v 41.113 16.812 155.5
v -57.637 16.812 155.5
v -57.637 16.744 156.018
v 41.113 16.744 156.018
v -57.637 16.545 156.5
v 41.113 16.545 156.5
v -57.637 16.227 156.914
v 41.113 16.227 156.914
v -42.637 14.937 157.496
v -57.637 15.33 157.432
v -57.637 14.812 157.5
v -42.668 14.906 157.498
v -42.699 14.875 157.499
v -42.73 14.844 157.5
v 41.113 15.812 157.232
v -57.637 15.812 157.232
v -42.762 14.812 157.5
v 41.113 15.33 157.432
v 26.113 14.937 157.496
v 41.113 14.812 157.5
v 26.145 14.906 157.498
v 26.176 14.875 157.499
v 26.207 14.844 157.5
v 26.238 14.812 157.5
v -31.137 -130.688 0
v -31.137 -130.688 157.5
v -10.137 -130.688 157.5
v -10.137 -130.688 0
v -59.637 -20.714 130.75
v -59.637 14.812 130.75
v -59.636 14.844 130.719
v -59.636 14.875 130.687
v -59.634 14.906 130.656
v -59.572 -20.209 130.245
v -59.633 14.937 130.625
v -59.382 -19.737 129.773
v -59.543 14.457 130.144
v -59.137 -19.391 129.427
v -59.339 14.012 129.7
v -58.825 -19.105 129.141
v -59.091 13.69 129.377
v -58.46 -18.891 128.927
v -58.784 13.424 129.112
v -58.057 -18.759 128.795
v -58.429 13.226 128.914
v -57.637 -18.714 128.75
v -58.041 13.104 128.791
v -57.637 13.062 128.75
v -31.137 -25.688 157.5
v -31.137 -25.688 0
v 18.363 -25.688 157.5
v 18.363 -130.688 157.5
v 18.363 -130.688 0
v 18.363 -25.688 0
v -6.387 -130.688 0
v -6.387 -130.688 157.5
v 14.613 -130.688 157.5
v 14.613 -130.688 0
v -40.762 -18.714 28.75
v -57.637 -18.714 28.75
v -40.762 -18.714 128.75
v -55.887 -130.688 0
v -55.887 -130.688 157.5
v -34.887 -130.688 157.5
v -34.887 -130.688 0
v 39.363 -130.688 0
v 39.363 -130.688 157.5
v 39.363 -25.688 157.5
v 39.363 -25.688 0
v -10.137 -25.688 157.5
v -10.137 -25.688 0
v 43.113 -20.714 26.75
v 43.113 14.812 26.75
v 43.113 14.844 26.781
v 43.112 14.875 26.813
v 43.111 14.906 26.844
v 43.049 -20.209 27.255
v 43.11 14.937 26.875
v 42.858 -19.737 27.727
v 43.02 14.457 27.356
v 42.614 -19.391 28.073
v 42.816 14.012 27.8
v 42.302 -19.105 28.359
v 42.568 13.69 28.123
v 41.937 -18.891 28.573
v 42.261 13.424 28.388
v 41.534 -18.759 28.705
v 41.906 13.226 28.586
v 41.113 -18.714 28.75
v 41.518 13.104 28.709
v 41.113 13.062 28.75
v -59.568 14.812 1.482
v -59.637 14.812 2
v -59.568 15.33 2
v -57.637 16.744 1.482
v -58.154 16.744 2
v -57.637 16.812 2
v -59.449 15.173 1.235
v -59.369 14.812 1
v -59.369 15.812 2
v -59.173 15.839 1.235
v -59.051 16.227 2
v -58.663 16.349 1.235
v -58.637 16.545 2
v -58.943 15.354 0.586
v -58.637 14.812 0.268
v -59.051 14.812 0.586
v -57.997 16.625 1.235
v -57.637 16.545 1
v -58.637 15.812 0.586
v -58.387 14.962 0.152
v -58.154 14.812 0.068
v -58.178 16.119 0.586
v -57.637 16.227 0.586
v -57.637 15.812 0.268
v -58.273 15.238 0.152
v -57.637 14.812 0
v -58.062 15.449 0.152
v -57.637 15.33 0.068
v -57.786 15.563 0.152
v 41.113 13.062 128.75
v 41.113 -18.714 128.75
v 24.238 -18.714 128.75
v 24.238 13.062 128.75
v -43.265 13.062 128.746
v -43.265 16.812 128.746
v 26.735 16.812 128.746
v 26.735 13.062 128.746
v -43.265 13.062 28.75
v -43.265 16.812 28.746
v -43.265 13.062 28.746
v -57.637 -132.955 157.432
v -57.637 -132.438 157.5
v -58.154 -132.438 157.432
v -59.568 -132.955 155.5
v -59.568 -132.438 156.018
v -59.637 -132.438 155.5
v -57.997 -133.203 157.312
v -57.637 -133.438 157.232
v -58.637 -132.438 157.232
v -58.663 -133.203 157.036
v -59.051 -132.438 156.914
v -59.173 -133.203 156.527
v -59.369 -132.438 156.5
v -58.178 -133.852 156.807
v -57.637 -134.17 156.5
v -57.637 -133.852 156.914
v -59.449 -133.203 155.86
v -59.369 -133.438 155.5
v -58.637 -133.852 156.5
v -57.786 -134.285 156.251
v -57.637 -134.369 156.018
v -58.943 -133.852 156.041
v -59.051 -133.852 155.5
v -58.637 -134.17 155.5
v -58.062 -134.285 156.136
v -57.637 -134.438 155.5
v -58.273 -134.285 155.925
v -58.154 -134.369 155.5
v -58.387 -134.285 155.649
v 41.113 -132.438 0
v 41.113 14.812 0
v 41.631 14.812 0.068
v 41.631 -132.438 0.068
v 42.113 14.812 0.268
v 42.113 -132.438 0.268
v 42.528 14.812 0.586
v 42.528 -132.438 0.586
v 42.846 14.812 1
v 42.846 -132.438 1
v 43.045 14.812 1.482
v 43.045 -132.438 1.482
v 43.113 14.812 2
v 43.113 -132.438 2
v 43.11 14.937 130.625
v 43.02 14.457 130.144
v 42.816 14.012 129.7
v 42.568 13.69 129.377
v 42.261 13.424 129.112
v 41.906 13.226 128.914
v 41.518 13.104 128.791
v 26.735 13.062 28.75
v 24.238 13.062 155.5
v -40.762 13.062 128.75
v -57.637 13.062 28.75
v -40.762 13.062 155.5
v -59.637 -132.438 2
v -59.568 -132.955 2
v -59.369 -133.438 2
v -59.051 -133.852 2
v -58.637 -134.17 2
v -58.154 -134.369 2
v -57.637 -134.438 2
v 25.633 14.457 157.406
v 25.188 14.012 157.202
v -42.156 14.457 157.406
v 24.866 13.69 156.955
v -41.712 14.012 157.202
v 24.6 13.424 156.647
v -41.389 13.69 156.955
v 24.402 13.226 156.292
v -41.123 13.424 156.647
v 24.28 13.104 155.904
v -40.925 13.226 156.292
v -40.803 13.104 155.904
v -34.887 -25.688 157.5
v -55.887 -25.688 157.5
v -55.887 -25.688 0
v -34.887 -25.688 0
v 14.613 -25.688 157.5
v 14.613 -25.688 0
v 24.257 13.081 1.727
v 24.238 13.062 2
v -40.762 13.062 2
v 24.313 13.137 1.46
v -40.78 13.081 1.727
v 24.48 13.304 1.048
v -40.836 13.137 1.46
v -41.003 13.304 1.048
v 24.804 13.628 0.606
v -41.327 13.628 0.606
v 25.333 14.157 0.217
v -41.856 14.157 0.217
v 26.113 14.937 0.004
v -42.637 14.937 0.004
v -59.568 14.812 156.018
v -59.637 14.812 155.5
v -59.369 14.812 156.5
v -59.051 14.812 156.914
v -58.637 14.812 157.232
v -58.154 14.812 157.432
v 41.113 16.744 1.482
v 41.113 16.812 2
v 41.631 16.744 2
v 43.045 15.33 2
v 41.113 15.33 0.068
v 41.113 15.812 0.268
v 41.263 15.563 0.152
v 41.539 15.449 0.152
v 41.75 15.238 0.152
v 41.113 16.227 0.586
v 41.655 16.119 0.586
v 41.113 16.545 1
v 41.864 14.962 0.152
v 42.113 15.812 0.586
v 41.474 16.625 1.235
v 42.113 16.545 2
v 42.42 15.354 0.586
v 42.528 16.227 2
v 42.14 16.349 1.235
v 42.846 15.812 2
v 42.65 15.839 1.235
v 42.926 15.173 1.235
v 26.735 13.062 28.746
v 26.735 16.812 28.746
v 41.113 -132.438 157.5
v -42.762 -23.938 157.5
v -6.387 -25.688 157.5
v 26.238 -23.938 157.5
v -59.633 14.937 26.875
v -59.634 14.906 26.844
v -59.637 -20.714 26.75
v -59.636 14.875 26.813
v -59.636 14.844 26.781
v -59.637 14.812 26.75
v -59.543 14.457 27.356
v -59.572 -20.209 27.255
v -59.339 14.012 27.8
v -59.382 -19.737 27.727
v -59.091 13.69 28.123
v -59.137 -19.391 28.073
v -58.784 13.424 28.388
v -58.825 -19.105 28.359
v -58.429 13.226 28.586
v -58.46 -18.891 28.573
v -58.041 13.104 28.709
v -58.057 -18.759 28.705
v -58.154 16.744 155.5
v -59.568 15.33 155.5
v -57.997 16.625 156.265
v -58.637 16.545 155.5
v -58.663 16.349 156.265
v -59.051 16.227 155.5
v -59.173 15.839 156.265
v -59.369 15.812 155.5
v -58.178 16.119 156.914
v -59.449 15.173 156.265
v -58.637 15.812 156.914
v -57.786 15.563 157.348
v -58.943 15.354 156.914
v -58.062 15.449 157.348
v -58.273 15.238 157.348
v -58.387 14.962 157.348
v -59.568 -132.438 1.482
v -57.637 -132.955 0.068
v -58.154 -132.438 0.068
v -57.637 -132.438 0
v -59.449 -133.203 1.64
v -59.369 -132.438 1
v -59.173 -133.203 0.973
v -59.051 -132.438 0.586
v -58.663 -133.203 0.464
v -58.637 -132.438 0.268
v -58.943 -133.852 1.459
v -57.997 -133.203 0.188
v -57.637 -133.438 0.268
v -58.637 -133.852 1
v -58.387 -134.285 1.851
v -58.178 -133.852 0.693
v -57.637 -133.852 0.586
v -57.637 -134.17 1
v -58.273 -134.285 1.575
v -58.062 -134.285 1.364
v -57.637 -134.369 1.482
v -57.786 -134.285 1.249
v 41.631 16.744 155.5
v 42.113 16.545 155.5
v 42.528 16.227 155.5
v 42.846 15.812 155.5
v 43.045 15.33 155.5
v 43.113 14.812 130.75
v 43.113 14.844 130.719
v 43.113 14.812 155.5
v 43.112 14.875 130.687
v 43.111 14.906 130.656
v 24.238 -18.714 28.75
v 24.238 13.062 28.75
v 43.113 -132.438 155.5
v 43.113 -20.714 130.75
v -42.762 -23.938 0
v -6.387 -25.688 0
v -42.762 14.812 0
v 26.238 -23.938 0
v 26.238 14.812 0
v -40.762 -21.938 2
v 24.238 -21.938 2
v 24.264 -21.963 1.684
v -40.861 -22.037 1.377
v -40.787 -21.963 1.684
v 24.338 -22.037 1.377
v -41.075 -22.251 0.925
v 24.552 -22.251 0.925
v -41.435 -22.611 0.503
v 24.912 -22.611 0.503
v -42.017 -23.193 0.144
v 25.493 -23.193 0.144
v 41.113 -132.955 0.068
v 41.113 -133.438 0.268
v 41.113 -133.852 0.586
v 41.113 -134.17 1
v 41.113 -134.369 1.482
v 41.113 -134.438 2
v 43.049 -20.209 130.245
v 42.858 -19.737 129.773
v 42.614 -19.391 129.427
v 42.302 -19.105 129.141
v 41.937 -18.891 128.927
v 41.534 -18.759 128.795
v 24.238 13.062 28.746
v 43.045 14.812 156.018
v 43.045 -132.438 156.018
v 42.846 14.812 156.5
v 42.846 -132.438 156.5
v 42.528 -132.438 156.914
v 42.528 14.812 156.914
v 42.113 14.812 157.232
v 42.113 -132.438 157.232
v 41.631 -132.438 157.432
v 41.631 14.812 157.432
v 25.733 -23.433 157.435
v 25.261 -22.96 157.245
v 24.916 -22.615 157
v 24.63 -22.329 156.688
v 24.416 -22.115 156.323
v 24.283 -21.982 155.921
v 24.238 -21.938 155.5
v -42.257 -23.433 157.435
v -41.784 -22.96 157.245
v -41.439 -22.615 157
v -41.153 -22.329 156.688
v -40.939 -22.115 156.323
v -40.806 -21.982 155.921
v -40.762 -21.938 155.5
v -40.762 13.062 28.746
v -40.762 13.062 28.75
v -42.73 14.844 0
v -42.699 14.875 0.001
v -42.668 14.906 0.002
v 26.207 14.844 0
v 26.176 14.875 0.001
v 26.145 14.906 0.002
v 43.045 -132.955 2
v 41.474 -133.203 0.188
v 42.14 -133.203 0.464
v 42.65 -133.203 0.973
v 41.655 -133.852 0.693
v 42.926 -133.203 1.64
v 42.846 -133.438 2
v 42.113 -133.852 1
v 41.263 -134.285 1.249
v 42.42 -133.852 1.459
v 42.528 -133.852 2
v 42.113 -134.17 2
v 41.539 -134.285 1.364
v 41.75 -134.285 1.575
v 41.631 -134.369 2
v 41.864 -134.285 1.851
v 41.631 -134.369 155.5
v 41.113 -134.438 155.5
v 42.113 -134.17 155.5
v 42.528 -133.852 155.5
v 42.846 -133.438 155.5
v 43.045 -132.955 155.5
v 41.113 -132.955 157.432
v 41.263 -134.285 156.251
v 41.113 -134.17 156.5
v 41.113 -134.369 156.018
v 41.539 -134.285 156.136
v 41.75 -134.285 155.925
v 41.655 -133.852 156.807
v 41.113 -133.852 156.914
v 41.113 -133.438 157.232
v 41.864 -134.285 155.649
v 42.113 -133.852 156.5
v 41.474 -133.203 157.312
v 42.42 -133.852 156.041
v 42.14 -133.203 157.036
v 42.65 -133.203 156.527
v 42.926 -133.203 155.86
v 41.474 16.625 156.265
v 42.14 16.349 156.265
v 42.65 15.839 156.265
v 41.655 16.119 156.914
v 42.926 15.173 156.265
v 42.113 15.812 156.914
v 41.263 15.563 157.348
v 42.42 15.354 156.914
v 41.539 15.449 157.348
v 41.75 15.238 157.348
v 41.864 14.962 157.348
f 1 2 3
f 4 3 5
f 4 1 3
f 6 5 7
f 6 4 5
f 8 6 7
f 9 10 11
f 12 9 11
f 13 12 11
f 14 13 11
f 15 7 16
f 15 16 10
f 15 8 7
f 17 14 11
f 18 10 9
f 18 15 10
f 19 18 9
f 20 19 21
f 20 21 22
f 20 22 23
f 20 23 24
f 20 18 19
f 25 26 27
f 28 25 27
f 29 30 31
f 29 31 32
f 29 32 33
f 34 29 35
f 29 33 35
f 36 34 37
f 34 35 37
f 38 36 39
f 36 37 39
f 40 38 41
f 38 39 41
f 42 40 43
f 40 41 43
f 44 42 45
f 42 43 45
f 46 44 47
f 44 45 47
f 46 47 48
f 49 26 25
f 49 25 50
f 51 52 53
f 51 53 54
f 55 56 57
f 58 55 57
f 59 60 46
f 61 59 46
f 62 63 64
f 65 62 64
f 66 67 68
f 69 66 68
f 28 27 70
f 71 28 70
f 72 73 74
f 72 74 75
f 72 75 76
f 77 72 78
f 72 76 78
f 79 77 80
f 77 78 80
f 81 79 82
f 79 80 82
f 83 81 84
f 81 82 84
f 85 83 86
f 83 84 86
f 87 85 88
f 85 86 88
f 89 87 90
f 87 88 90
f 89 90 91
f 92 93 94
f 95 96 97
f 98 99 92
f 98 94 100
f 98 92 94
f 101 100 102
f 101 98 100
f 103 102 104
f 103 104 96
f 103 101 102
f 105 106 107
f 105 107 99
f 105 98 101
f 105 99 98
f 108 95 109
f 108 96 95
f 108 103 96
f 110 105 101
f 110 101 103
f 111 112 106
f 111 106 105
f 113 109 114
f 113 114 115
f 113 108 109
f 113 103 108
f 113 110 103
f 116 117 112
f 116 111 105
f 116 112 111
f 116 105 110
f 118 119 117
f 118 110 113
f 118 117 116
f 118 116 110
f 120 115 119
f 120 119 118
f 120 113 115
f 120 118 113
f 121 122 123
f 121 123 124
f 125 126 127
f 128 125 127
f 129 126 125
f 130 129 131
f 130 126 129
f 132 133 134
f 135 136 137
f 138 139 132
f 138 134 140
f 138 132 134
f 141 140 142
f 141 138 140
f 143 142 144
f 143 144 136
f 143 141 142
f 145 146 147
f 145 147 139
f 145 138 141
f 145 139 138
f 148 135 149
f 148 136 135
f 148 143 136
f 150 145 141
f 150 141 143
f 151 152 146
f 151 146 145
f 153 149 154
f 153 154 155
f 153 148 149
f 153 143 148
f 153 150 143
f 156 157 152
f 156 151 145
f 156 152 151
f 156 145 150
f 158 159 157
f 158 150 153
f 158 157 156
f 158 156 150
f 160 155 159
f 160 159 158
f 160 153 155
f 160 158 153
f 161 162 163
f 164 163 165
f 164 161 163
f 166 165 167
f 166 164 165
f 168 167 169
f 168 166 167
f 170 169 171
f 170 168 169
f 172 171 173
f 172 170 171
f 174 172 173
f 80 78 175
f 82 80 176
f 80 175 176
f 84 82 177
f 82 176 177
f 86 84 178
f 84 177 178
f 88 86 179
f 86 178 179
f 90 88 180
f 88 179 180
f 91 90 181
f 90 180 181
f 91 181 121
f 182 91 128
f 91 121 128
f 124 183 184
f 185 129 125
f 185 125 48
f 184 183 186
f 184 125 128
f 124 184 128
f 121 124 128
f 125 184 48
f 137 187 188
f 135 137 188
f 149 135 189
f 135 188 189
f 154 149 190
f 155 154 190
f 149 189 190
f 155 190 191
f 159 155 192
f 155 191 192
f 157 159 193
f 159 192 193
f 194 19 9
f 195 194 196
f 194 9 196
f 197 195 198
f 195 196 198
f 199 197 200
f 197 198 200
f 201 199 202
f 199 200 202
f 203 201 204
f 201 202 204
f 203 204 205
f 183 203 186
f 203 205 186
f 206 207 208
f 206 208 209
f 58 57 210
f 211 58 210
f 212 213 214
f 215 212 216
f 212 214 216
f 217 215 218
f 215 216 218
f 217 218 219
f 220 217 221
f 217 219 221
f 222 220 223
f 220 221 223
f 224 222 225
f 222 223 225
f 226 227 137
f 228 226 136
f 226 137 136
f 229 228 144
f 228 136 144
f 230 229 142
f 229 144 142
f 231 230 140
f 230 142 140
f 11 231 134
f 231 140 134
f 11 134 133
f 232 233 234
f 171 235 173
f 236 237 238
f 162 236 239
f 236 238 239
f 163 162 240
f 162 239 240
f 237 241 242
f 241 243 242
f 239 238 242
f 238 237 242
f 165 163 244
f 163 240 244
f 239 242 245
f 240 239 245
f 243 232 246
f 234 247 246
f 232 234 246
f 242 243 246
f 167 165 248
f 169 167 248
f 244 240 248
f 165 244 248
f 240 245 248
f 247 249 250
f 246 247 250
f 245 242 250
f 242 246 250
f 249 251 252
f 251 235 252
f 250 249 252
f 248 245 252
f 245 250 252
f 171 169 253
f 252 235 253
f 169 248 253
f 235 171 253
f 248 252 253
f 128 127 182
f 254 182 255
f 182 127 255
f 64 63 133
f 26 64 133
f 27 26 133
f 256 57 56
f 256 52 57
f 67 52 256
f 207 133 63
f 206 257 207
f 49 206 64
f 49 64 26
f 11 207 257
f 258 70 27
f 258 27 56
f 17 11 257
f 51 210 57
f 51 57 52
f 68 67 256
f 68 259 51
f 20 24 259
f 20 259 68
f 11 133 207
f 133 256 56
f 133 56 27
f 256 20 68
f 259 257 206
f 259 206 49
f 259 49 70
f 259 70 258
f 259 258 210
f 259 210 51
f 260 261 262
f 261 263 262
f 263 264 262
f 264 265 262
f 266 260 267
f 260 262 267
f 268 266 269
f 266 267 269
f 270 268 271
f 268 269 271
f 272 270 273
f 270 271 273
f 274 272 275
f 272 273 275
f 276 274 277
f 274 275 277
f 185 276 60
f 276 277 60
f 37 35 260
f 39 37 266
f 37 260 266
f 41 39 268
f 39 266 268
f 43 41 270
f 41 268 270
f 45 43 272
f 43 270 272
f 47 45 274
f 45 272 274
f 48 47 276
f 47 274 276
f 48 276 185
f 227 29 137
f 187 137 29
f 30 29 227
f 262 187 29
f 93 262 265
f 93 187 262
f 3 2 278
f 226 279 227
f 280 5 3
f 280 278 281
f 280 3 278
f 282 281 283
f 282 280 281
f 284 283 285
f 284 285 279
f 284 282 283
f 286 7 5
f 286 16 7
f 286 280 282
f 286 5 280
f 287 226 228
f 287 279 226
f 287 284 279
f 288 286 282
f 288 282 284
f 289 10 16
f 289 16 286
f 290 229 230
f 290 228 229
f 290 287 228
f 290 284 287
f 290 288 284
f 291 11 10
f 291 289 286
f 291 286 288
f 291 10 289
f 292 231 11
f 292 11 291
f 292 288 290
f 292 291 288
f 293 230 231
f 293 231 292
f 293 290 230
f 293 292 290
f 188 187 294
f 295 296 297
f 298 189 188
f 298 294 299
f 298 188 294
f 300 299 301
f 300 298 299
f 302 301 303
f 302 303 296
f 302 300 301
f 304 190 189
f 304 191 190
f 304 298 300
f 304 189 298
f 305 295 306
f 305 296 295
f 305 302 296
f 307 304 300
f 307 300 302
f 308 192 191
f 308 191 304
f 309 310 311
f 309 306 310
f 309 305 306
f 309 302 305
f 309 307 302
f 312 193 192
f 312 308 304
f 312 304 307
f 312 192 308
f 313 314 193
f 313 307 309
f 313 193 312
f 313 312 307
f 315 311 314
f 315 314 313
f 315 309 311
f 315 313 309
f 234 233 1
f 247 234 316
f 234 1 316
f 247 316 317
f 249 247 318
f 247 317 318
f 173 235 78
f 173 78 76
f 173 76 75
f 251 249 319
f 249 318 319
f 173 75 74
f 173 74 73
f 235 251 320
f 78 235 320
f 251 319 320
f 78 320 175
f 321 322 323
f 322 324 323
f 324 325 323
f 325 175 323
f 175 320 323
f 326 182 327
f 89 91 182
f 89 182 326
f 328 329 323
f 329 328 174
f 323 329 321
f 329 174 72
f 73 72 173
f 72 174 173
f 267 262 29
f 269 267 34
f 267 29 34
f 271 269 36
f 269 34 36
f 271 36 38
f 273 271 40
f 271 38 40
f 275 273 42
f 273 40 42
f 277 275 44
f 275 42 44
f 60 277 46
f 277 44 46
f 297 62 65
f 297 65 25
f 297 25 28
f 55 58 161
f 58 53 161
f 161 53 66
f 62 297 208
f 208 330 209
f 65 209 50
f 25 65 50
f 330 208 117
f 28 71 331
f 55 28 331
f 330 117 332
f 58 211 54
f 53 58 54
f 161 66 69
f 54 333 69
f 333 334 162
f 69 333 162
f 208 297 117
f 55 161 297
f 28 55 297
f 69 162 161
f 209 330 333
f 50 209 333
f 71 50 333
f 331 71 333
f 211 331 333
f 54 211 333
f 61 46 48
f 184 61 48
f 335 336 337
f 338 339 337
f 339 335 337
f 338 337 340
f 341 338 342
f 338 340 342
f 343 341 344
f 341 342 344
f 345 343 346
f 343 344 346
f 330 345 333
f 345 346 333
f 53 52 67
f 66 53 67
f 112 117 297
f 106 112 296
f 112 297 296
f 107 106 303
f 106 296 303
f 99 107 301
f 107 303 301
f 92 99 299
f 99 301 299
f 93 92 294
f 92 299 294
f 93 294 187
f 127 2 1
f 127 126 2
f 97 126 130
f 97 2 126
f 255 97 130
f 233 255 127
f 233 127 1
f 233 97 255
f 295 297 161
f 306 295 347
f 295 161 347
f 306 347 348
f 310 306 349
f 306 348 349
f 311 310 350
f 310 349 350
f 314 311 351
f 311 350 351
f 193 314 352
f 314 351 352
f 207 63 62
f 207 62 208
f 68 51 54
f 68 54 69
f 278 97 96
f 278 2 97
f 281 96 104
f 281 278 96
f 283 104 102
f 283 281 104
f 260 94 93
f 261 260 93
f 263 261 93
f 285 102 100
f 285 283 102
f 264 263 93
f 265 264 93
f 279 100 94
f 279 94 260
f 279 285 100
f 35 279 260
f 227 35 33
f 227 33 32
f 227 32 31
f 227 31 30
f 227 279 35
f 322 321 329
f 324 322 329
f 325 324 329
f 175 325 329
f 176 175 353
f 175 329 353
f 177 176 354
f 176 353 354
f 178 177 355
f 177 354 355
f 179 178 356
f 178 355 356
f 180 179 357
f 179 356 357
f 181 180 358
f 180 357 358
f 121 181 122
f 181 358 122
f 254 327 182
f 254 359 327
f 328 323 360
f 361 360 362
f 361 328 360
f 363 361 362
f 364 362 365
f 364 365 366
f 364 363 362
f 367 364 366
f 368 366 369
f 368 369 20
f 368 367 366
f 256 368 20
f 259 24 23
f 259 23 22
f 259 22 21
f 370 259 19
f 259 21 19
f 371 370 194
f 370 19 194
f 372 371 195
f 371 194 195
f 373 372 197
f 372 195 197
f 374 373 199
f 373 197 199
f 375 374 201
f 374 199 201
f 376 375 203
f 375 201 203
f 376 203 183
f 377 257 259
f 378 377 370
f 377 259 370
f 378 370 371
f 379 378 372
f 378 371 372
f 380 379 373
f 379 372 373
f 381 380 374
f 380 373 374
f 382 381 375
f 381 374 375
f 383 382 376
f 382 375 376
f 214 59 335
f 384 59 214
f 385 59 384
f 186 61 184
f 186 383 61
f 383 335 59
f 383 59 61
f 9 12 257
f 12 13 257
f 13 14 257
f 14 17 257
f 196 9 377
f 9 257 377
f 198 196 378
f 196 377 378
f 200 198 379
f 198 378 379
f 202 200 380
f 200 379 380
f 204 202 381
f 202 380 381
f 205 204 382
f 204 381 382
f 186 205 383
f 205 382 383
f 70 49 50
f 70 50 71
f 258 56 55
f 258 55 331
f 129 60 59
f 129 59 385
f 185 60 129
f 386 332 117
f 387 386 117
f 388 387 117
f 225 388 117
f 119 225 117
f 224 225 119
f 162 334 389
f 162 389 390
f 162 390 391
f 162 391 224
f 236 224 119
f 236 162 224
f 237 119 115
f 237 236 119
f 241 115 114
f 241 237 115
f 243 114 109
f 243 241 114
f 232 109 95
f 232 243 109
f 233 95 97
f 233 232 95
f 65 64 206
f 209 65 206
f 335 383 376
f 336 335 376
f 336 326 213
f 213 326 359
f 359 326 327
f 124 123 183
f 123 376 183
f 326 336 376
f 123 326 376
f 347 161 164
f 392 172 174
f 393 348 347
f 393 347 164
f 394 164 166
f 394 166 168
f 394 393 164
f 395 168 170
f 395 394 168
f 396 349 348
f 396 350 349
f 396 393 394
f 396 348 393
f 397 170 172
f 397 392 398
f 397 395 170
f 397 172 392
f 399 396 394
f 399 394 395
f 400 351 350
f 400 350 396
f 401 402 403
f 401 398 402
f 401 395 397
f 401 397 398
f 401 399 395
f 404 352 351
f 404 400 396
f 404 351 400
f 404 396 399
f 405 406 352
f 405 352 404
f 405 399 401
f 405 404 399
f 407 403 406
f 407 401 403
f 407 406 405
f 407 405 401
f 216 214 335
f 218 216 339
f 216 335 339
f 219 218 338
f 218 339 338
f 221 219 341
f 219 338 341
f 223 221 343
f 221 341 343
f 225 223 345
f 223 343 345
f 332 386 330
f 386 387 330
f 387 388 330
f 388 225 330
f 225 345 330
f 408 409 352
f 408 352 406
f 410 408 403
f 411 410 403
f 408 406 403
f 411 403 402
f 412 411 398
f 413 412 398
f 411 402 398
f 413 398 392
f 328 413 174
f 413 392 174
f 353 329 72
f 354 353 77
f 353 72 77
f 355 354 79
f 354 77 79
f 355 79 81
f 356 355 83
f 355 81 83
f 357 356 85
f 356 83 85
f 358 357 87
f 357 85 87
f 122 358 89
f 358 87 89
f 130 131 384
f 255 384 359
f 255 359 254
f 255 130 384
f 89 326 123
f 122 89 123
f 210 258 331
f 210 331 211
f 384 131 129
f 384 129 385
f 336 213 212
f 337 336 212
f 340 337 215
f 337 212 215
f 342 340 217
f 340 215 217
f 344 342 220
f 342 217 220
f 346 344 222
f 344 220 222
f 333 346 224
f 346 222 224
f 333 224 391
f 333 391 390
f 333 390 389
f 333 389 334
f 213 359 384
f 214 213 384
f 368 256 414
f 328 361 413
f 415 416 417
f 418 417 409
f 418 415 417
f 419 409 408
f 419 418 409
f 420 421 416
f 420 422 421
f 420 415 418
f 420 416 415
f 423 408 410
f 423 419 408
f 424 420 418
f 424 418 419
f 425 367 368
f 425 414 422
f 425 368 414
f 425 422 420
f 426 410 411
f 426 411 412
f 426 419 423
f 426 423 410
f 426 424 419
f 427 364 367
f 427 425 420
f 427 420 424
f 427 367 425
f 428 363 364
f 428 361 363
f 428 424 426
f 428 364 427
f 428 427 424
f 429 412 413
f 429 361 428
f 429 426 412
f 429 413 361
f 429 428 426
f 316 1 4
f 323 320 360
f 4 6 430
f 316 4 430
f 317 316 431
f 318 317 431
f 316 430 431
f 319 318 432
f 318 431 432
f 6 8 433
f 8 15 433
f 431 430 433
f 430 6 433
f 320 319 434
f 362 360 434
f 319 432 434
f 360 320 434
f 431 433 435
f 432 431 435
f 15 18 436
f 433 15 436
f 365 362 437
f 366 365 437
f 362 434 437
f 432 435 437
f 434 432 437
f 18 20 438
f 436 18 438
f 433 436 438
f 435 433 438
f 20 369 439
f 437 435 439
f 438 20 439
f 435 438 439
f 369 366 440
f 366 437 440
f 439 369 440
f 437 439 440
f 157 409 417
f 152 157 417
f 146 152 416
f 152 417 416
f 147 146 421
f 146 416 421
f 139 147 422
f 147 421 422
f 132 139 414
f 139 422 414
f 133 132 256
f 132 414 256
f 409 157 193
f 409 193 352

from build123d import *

# Parameters (mm, degrees)
SKETCH7_W           = 102.75
SKETCH7_H           = 151.25
BOSS_EXTRUDE4_DEPTH = 157.5
SKETCH9_W           = 65
SKETCH9_H           = 35
SKETCH9_W_2         = 21
SKETCH9_H_2         = 105
CUT_EXTRUDE5_DEPTH  = 157.5
SKETCH10_W          = 100
SKETCH10_H          = 31.776495021
CUT_EXTRUDE6_DEPTH  = 157.5
FILLET3_R           = 2
FILLET4_R           = 2
FILLET6_R           = 2
FILLET7_R           = 2
FILLET8_R           = 2
FILLET9_R           = 2
SKETCH13_W          = 70
SKETCH13_H          = 100
CUT_EXTRUDE7_DEPTH  = 3.75


with BuildPart() as part:
    # Sketch7 → Boss-Extrude4 (new body)
    with BuildSketch(Plane.XY):
        with Locations((-8.261523783, -58.812543528)):
            Rectangle(SKETCH7_W, SKETCH7_H)
    extrude(amount=BOSS_EXTRUDE4_DEPTH)

    # Sketch9 → Cut-Extrude5 (cut)
    with BuildSketch(Plane.XY.offset(157.5)):
        with Locations((-8.261523783, -4.437543528)):
            Rectangle(SKETCH9_W, SKETCH9_H)
        with Locations((-45.386523783, -78.187543528)):
            Rectangle(SKETCH9_W_2, SKETCH9_H_2)
        with Locations((-20.636523783, -78.187543528)):
            Rectangle(SKETCH9_W_2, SKETCH9_H_2)
        with Locations((4.113476217, -78.187543528)):
            Rectangle(SKETCH9_W_2, SKETCH9_H_2)
        with Locations((28.863476217, -78.187543528)):
            Rectangle(SKETCH9_W_2, SKETCH9_H_2)
    extrude(amount=-CUT_EXTRUDE5_DEPTH, mode=Mode.SUBTRACT)

    # Sketch10 → Cut-Extrude6 (cut)
    with BuildSketch(Plane.ZY.offset(59.636523783)):
        with Locations((78.75, -2.825791039)):
            Rectangle(SKETCH10_W, SKETCH10_H)
    extrude(amount=-CUT_EXTRUDE6_DEPTH, mode=Mode.SUBTRACT)

    # Fillet3
    fillet3_edges = [part.edges().sort_by_distance(p)[0] for p in [
        (43.113476217, 16.812456472, 78.75),
    ]]
    fillet(fillet3_edges, radius=FILLET3_R)

    # Fillet4
    fillet4_edges = [part.edges().sort_by_distance(p)[0] for p in [
        (-9.261523783, 16.812456472, 0),
        (-9.261523783, 16.812456472, 157.5),
        (42.52768978, 16.226670034, 0),
        (42.52768978, 16.226670034, 157.5),
        (43.113476217, -59.812543528, 157.5),
        (43.113476217, -59.812543528, 0),
        (-59.636523783, 16.812456472, 78.75),
    ]]
    fillet(fillet4_edges, radius=FILLET4_R)

    # Fillet6
    # the kernel refuses this fillet: 2 mm, written as the material it takes off along each edge
    with BuildSketch(Plane(origin=(-57.636523783, 14.812456472, 155.5), x_dir=(-1, 0, 0), z_dir=(0, 0, 1))) as fillet6_piece_1_section:
        Polygon((0, 0), (FILLET6_R, 0), (FILLET6_R, -FILLET6_R), (0, -FILLET6_R), align=None)
    fillet6_piece_1 = extrude(amount=FILLET6_R, mode=Mode.PRIVATE)
    fillet6_piece_1 = fillet6_piece_1 - Plane(origin=(-57.636523783, 14.812456472, 155.5), x_dir=(0.7071067811865475, -0.7071067811865475, 0), z_dir=(0, 0, 1)) * Sphere(FILLET6_R, mode=Mode.PRIVATE)
    add(fillet6_piece_1, mode=Mode.SUBTRACT)
    with BuildSketch(Plane(origin=(-57.636523783, 14.812456472, 2), x_dir=(-1, 0, 0), z_dir=(0, 0, -1))) as fillet6_piece_2_section:
        Polygon((0, 0), (FILLET6_R, 0), (FILLET6_R, FILLET6_R), (0, FILLET6_R), align=None)
    fillet6_piece_2 = extrude(amount=FILLET6_R, mode=Mode.PRIVATE)
    fillet6_piece_2 = fillet6_piece_2 - Plane(origin=(-57.636523783, 14.812456472, 2), x_dir=(0.7071067811865475, -0.7071067811865475, 0), z_dir=(0, 0, -1)) * Sphere(FILLET6_R, mode=Mode.PRIVATE)
    add(fillet6_piece_2, mode=Mode.SUBTRACT)
    with BuildSketch(Plane(origin=(-59.636523783, -139.437543528, 0), x_dir=(1, 0, 0), z_dir=(0, 1, 0))) as fillet6_piece_3:
        with BuildLine():
            CenterArc((FILLET6_R, -FILLET6_R), FILLET6_R, 90, 90)
            Line((0, -FILLET6_R), (0, 0))
            Line((0, 0), (FILLET6_R, 0))
        make_face()
    extrude(amount=154.25, mode=Mode.SUBTRACT)
    with BuildSketch(Plane(origin=(-59.636523783, -139.437543528, 157.5), x_dir=(1, 0, 0), z_dir=(0, 1, 0))) as fillet6_piece_4:
        with BuildLine():
            CenterArc((FILLET6_R, FILLET6_R), FILLET6_R, 180, 90)
            Line((0, FILLET6_R), (0, 0))
            Line((0, 0), (FILLET6_R, 0))
        make_face()
    extrude(amount=154.25, mode=Mode.SUBTRACT)
    with BuildSketch(Plane(origin=(-59.636523783, -134.437543528, -5), x_dir=(1, 0, 0), z_dir=(0, 0, 1))) as fillet6_piece_5:
        with BuildLine():
            CenterArc((FILLET6_R, FILLET6_R), FILLET6_R, 180, 90)
            Line((0, FILLET6_R), (0, 0))
            Line((0, 0), (FILLET6_R, 0))
        make_face()
    extrude(amount=167.5, mode=Mode.SUBTRACT)

    # Fillet7
    # the kernel refuses this fillet: 2 mm, written as the material it takes off along each edge
    with BuildSketch(Plane(origin=(-57.636523783, -132.437543528, 155.5), x_dir=(0, 0, 1), z_dir=(0, -1, 0))) as fillet7_piece_1_section:
        Polygon((0, 0), (FILLET7_R, 0), (FILLET7_R, FILLET7_R), (0, FILLET7_R), align=None)
    fillet7_piece_1 = extrude(amount=FILLET7_R, mode=Mode.PRIVATE)
    fillet7_piece_1 = fillet7_piece_1 - Plane(origin=(-57.636523783, -132.437543528, 155.5), x_dir=(0.7071067811865475, 0, -0.7071067811865475), z_dir=(0, -1, 0)) * Sphere(FILLET7_R, mode=Mode.PRIVATE)
    add(fillet7_piece_1, mode=Mode.SUBTRACT)
    with BuildSketch(Plane(origin=(-57.636523783, -132.437543528, 2), x_dir=(0, 0, -1), z_dir=(0, -1, 0))) as fillet7_piece_2_section:
        Polygon((0, 0), (FILLET7_R, 0), (FILLET7_R, -FILLET7_R), (0, -FILLET7_R), align=None)
    fillet7_piece_2 = extrude(amount=FILLET7_R, mode=Mode.PRIVATE)
    fillet7_piece_2 = fillet7_piece_2 - Plane(origin=(-57.636523783, -132.437543528, 2), x_dir=(0.7071067811865475, 0, 0.7071067811865475), z_dir=(0, -1, 0)) * Sphere(FILLET7_R, mode=Mode.PRIVATE)
    add(fillet7_piece_2, mode=Mode.SUBTRACT)
    with BuildSketch(Plane(origin=(43.113476217, -134.437543528, 2), x_dir=(0, 1, 0), z_dir=(0, 0, 1))) as fillet7_piece_3:
        with BuildLine():
            CenterArc((FILLET7_R, FILLET7_R), FILLET7_R, 180, 90)
            Line((0, FILLET7_R), (0, 0))
            Line((0, 0), (FILLET7_R, 0))
        make_face()
    extrude(amount=153.5, mode=Mode.SUBTRACT)
    with BuildSketch(Plane(origin=(41.113476217, -134.437543528, 155.5), x_dir=(0, 0, 1), z_dir=(-1, 0, 0))) as fillet7_piece_4:
        with BuildLine():
            CenterArc((2 - FILLET7_R, FILLET7_R), FILLET7_R, 270, 90)
            Line((2 - FILLET7_R, 0), (2, 0))
            Line((2, 0), (2, FILLET7_R))
        make_face()
    revolve(axis=Axis((41.113476217, -134.437543528, 155.5), (0, 1, 0)), revolution_arc=90, mode=Mode.SUBTRACT)
    with BuildSketch(Plane(origin=(41.113476217, -134.437543528, 2), x_dir=(0, 0, -1), z_dir=(-1, 0, 0))) as fillet7_piece_5:
        with BuildLine():
            CenterArc((2 - FILLET7_R, -FILLET7_R), FILLET7_R, 0, 90)
            Line((2 - FILLET7_R, 0), (2, 0))
            Line((2, 0), (2, -FILLET7_R))
        make_face()
    revolve(axis=Axis((41.113476217, -134.437543528, 2), (0, -1, 0)), revolution_arc=90, mode=Mode.SUBTRACT)
    with BuildSketch(Plane(origin=(41.113476217, -134.437543528, 0), x_dir=(0, 0, 1), z_dir=(-1, 0, 0))) as fillet7_piece_6:
        with BuildLine():
            CenterArc((FILLET7_R, FILLET7_R), FILLET7_R, 180, 90)
            Line((0, FILLET7_R), (0, 0))
            Line((0, 0), (FILLET7_R, 0))
        make_face()
    extrude(amount=98.75, mode=Mode.SUBTRACT)
    with BuildSketch(Plane(origin=(41.113476217, -134.437543528, 157.5), x_dir=(0, 0, -1), z_dir=(-1, 0, 0))) as fillet7_piece_7:
        with BuildLine():
            CenterArc((FILLET7_R, -FILLET7_R), FILLET7_R, 90, 90)
            Line((0, -FILLET7_R), (0, 0))
            Line((0, 0), (FILLET7_R, 0))
        make_face()
    extrude(amount=98.75, mode=Mode.SUBTRACT)

    # Fillet8
    # the kernel refuses this fillet: 2 mm, written as the material it takes off along each edge
    with BuildSketch(Plane(origin=(-40.761523783, -21.937543528, 0), x_dir=(-1, 0, 0), z_dir=(0, 1, 0)), Plane(origin=(24.238476217, 13.062456472, 0), x_dir=(1, 0, 0), z_dir=(0, -1, 0))) as fillet8_piece_1:
        with BuildLine():
            CenterArc((FILLET8_R, FILLET8_R), FILLET8_R, 180, 90)
            Line((0, FILLET8_R), (0, 0))
            Line((0, 0), (FILLET8_R, 0))
        make_face()
    extrude(amount=35, mode=Mode.SUBTRACT)
    with BuildSketch(Plane(origin=(-40.761523783, 13.062456472, 0), x_dir=(0, 0, 1), z_dir=(1, 0, 0))) as fillet8_piece_2:
        with BuildLine():
            CenterArc((FILLET8_R, -FILLET8_R), FILLET8_R, 90, 90)
            Line((0, -FILLET8_R), (0, 0))
            Line((0, 0), (FILLET8_R, 0))
        make_face()
    extrude(amount=65, mode=Mode.SUBTRACT)
    with BuildSketch(Plane(origin=(24.238476217, -21.937543528, 0), x_dir=(0, -1, 0), z_dir=(-1, 0, 0))) as fillet8_piece_3:
        with BuildLine():
            CenterArc((FILLET8_R, FILLET8_R), FILLET8_R, 180, 90)
            Line((0, FILLET8_R), (0, 0))
            Line((0, 0), (FILLET8_R, 0))
        make_face()
    extrude(amount=65, mode=Mode.SUBTRACT)
    with BuildSketch(Plane(origin=(-40.761523783, -26.937543528, 0), x_dir=(-1, 0, 0), z_dir=(0, 1, 0))) as fillet8_piece_4a_section:
        with BuildLine():
            CenterArc((FILLET8_R, FILLET8_R), FILLET8_R, 180, 90)
            Line((0, FILLET8_R), (0, 0))
            Line((0, 0), (FILLET8_R, 0))
        make_face()
    fillet8_piece_4a = extrude(amount=40, mode=Mode.PRIVATE)
    fillet8_piece_4a = split(fillet8_piece_4a, bisect_by=Plane(origin=(-40.761523783, -21.937543528, 0), z_dir=(0, -1, 0)), keep=Keep.TOP, mode=Mode.PRIVATE)
    with BuildSketch(Plane(origin=(24.238476217, -21.937543528, 0), x_dir=(0, -1, 0), z_dir=(-1, 0, 0))) as fillet8_piece_4b_section:
        with BuildLine():
            CenterArc((FILLET8_R, FILLET8_R), FILLET8_R, 180, 90)
            Line((0, FILLET8_R), (0, 0))
            Line((0, 0), (FILLET8_R, 0))
        make_face()
    fillet8_piece_4b = extrude(amount=70, mode=Mode.PRIVATE)
    fillet8_piece_4b = split(fillet8_piece_4b, bisect_by=Plane(origin=(-40.761523783, -21.937543528, 0), z_dir=(-1, 0, 0)), keep=Keep.TOP, mode=Mode.PRIVATE)
    fillet8_piece_4 = fillet8_piece_4a & fillet8_piece_4b
    add(fillet8_piece_4, mode=Mode.SUBTRACT)
    with BuildSketch(Plane(origin=(-45.761523783, 13.062456472, 0), x_dir=(0, 0, 1), z_dir=(1, 0, 0))) as fillet8_piece_5a_section:
        with BuildLine():
            CenterArc((FILLET8_R, -FILLET8_R), FILLET8_R, 90, 90)
            Line((0, -FILLET8_R), (0, 0))
            Line((0, 0), (FILLET8_R, 0))
        make_face()
    fillet8_piece_5a = extrude(amount=70, mode=Mode.PRIVATE)
    fillet8_piece_5a = split(fillet8_piece_5a, bisect_by=Plane(origin=(-40.761523783, 13.062456472, 0), z_dir=(-1, 0, 0)), keep=Keep.TOP, mode=Mode.PRIVATE)
    with BuildSketch(Plane(origin=(-40.761523783, -21.937543528, 0), x_dir=(-1, 0, 0), z_dir=(0, 1, 0))) as fillet8_piece_5b_section:
        with BuildLine():
            CenterArc((FILLET8_R, FILLET8_R), FILLET8_R, 180, 90)
            Line((0, FILLET8_R), (0, 0))
            Line((0, 0), (FILLET8_R, 0))
        make_face()
    fillet8_piece_5b = extrude(amount=40, mode=Mode.PRIVATE)
    fillet8_piece_5b = split(fillet8_piece_5b, bisect_by=Plane(origin=(-40.761523783, 13.062456472, 0), z_dir=(0, 1, 0)), keep=Keep.TOP, mode=Mode.PRIVATE)
    fillet8_piece_5 = fillet8_piece_5a & fillet8_piece_5b
    add(fillet8_piece_5, mode=Mode.SUBTRACT)
    with BuildSketch(Plane(origin=(-40.761523783, 13.062456472, 0), x_dir=(0, 0, 1), z_dir=(1, 0, 0))) as fillet8_piece_6a_section:
        with BuildLine():
            CenterArc((FILLET8_R, -FILLET8_R), FILLET8_R, 90, 90)
            Line((0, -FILLET8_R), (0, 0))
            Line((0, 0), (FILLET8_R, 0))
        make_face()
    fillet8_piece_6a = extrude(amount=70, mode=Mode.PRIVATE)
    fillet8_piece_6a = split(fillet8_piece_6a, bisect_by=Plane(origin=(24.238476217, 13.062456472, 0), z_dir=(1, 0, 0)), keep=Keep.TOP, mode=Mode.PRIVATE)
    with BuildSketch(Plane(origin=(24.238476217, 18.062456472, 0), x_dir=(1, 0, 0), z_dir=(0, -1, 0))) as fillet8_piece_6b_section:
        with BuildLine():
            CenterArc((FILLET8_R, FILLET8_R), FILLET8_R, 180, 90)
            Line((0, FILLET8_R), (0, 0))
            Line((0, 0), (FILLET8_R, 0))
        make_face()
    fillet8_piece_6b = extrude(amount=40, mode=Mode.PRIVATE)
    fillet8_piece_6b = split(fillet8_piece_6b, bisect_by=Plane(origin=(24.238476217, 13.062456472, 0), z_dir=(0, 1, 0)), keep=Keep.TOP, mode=Mode.PRIVATE)
    fillet8_piece_6 = fillet8_piece_6a & fillet8_piece_6b
    add(fillet8_piece_6, mode=Mode.SUBTRACT)
    with BuildSketch(Plane(origin=(24.238476217, 13.062456472, 0), x_dir=(1, 0, 0), z_dir=(0, -1, 0))) as fillet8_piece_7a_section:
        with BuildLine():
            CenterArc((FILLET8_R, FILLET8_R), FILLET8_R, 180, 90)
            Line((0, FILLET8_R), (0, 0))
            Line((0, 0), (FILLET8_R, 0))
        make_face()
    fillet8_piece_7a = extrude(amount=40, mode=Mode.PRIVATE)
    fillet8_piece_7a = split(fillet8_piece_7a, bisect_by=Plane(origin=(24.238476217, -21.937543528, 0), z_dir=(0, -1, 0)), keep=Keep.TOP, mode=Mode.PRIVATE)
    with BuildSketch(Plane(origin=(29.238476217, -21.937543528, 0), x_dir=(0, -1, 0), z_dir=(-1, 0, 0))) as fillet8_piece_7b_section:
        with BuildLine():
            CenterArc((FILLET8_R, FILLET8_R), FILLET8_R, 180, 90)
            Line((0, FILLET8_R), (0, 0))
            Line((0, 0), (FILLET8_R, 0))
        make_face()
    fillet8_piece_7b = extrude(amount=70, mode=Mode.PRIVATE)
    fillet8_piece_7b = split(fillet8_piece_7b, bisect_by=Plane(origin=(24.238476217, -21.937543528, 0), z_dir=(1, 0, 0)), keep=Keep.TOP, mode=Mode.PRIVATE)
    fillet8_piece_7 = fillet8_piece_7a & fillet8_piece_7b
    add(fillet8_piece_7, mode=Mode.SUBTRACT)

    # Fillet9
    # the kernel refuses this fillet: 2 mm, written as the material it takes off along each edge
    with BuildSketch(Plane(origin=(-59.636523783, -18.714038549, 28.75), x_dir=(1, 0, 0), z_dir=(0, 1, 0))) as fillet9_piece_1:
        with BuildLine():
            CenterArc((FILLET9_R, FILLET9_R), FILLET9_R, 180, 90)
            Line((0, FILLET9_R), (0, 0))
            Line((0, 0), (FILLET9_R, 0))
        make_face()
    extrude(amount=31.776495021, mode=Mode.SUBTRACT)
    with BuildSketch(Plane(origin=(-59.636523783, -18.714038549, 128.75), x_dir=(0, -1, 0), z_dir=(0, 0, -1)), Plane(origin=(-59.636523783, 13.062456472, 28.75), x_dir=(0, 1, 0), z_dir=(0, 0, 1)), Plane(origin=(43.113476217, 13.062456472, 128.75), x_dir=(0, 1, 0), z_dir=(0, 0, -1)), Plane(origin=(43.113476217, -18.714038549, 28.75), x_dir=(0, -1, 0), z_dir=(0, 0, 1))) as fillet9_piece_2:
        with BuildLine():
            CenterArc((FILLET9_R, -FILLET9_R), FILLET9_R, 90, 90)
            Line((0, -FILLET9_R), (0, 0))
            Line((0, 0), (FILLET9_R, 0))
        make_face()
    extrude(amount=100, mode=Mode.SUBTRACT)
    with BuildSketch(Plane(origin=(-59.636523783, 13.062456472, 128.75), x_dir=(0, 0, 1), z_dir=(0, -1, 0)), Plane(origin=(43.113476217, 13.062456472, 28.75), x_dir=(0, 0, -1), z_dir=(0, -1, 0)), Plane(origin=(43.113476217, -18.714038549, 128.75), x_dir=(0, 0, 1), z_dir=(0, 1, 0))) as fillet9_piece_3:
        with BuildLine():
            CenterArc((FILLET9_R, -FILLET9_R), FILLET9_R, 90, 90)
            Line((0, -FILLET9_R), (0, 0))
            Line((0, 0), (FILLET9_R, 0))
        make_face()
    extrude(amount=31.776495021, mode=Mode.SUBTRACT)
    with BuildSketch(Plane(origin=(-40.761523783, -21.937543528, 157.5), x_dir=(0, 0, -1), z_dir=(0, 1, 0)), Plane(origin=(24.238476217, 13.062456472, 157.5), x_dir=(0, 0, -1), z_dir=(0, -1, 0))) as fillet9_piece_4:
        with BuildLine():
            CenterArc((FILLET9_R, FILLET9_R), FILLET9_R, 180, 90)
            Line((0, FILLET9_R), (0, 0))
            Line((0, 0), (FILLET9_R, 0))
        make_face()
    extrude(amount=35, mode=Mode.SUBTRACT)
    with BuildSketch(Plane(origin=(24.238476217, -21.937543528, 157.5), x_dir=(0, 0, -1), z_dir=(-1, 0, 0))) as fillet9_piece_5:
        with BuildLine():
            CenterArc((FILLET9_R, FILLET9_R), FILLET9_R, 180, 90)
            Line((0, FILLET9_R), (0, 0))
            Line((0, 0), (FILLET9_R, 0))
        make_face()
    extrude(amount=65, mode=Mode.SUBTRACT)
    with BuildSketch(Plane(origin=(-40.761523783, 13.062456472, 157.5), x_dir=(0, 1, 0), z_dir=(1, 0, 0))) as fillet9_piece_6:
        with BuildLine():
            CenterArc((FILLET9_R, -FILLET9_R), FILLET9_R, 90, 90)
            Line((0, -FILLET9_R), (0, 0))
            Line((0, 0), (FILLET9_R, 0))
        make_face()
    extrude(amount=65, mode=Mode.SUBTRACT)
    with BuildSketch(Plane(origin=(-59.636523783, -23.714038549, 28.75), x_dir=(1, 0, 0), z_dir=(0, 1, 0))) as fillet9_piece_7a_section:
        with BuildLine():
            CenterArc((FILLET9_R, FILLET9_R), FILLET9_R, 180, 90)
            Line((0, FILLET9_R), (0, 0))
            Line((0, 0), (FILLET9_R, 0))
        make_face()
    fillet9_piece_7a = extrude(amount=36.776495021, mode=Mode.PRIVATE)
    fillet9_piece_7a = split(fillet9_piece_7a, bisect_by=Plane(origin=(-59.636523783, -18.714038549, 28.75), z_dir=(0, -1, 0)), keep=Keep.TOP, mode=Mode.PRIVATE)
    with BuildSketch(Plane(origin=(-59.636523783, -18.714038549, 128.75), x_dir=(0, -1, 0), z_dir=(0, 0, -1))) as fillet9_piece_7b_section:
        with BuildLine():
            CenterArc((FILLET9_R, -FILLET9_R), FILLET9_R, 90, 90)
            Line((0, -FILLET9_R), (0, 0))
            Line((0, 0), (FILLET9_R, 0))
        make_face()
    fillet9_piece_7b = extrude(amount=105, mode=Mode.PRIVATE)
    fillet9_piece_7b = split(fillet9_piece_7b, bisect_by=Plane(origin=(-59.636523783, -18.714038549, 28.75), z_dir=(0, 0, -1)), keep=Keep.TOP, mode=Mode.PRIVATE)
    fillet9_piece_7 = fillet9_piece_7a & fillet9_piece_7b
    add(fillet9_piece_7, mode=Mode.SUBTRACT)
    with BuildSketch(Plane(origin=(-59.636523783, -18.714038549, 28.75), x_dir=(1, 0, 0), z_dir=(0, 1, 0))) as fillet9_piece_8a_section:
        with BuildLine():
            CenterArc((FILLET9_R, FILLET9_R), FILLET9_R, 180, 90)
            Line((0, FILLET9_R), (0, 0))
            Line((0, 0), (FILLET9_R, 0))
        make_face()
    fillet9_piece_8a = extrude(amount=36.776495021, mode=Mode.PRIVATE)
    fillet9_piece_8a = split(fillet9_piece_8a, bisect_by=Plane(origin=(-59.636523783, 13.062456472, 28.75), z_dir=(0, 1, 0)), keep=Keep.TOP, mode=Mode.PRIVATE)
    with BuildSketch(Plane(origin=(-59.636523783, 13.062456472, 23.75), x_dir=(0, 1, 0), z_dir=(0, 0, 1))) as fillet9_piece_8b_section:
        with BuildLine():
            CenterArc((FILLET9_R, -FILLET9_R), FILLET9_R, 90, 90)
            Line((0, -FILLET9_R), (0, 0))
            Line((0, 0), (FILLET9_R, 0))
        make_face()
    fillet9_piece_8b = extrude(amount=105, mode=Mode.PRIVATE)
    fillet9_piece_8b = split(fillet9_piece_8b, bisect_by=Plane(origin=(-59.636523783, 13.062456472, 28.75), z_dir=(0, 0, -1)), keep=Keep.TOP, mode=Mode.PRIVATE)
    fillet9_piece_8 = fillet9_piece_8a & fillet9_piece_8b
    add(fillet9_piece_8, mode=Mode.SUBTRACT)
    with BuildSketch(Plane(origin=(-59.636523783, -18.714038549, 133.75), x_dir=(0, -1, 0), z_dir=(0, 0, -1))) as fillet9_piece_9a_section:
        with BuildLine():
            CenterArc((FILLET9_R, -FILLET9_R), FILLET9_R, 90, 90)
            Line((0, -FILLET9_R), (0, 0))
            Line((0, 0), (FILLET9_R, 0))
        make_face()
    fillet9_piece_9a = extrude(amount=105, mode=Mode.PRIVATE)
    fillet9_piece_9a = split(fillet9_piece_9a, bisect_by=Plane(origin=(-59.636523783, -18.714038549, 128.75), z_dir=(0, 0, 1)), keep=Keep.TOP, mode=Mode.PRIVATE)
    with BuildSketch(Plane(origin=(-59.636523783, 13.062456472, 128.75), x_dir=(0, 0, 1), z_dir=(0, -1, 0))) as fillet9_piece_9b_section:
        with BuildLine():
            CenterArc((FILLET9_R, -FILLET9_R), FILLET9_R, 90, 90)
            Line((0, -FILLET9_R), (0, 0))
            Line((0, 0), (FILLET9_R, 0))
        make_face()
    fillet9_piece_9b = extrude(amount=36.776495021, mode=Mode.PRIVATE)
    fillet9_piece_9b = split(fillet9_piece_9b, bisect_by=Plane(origin=(-59.636523783, -18.714038549, 128.75), z_dir=(0, -1, 0)), keep=Keep.TOP, mode=Mode.PRIVATE)
    fillet9_piece_9 = fillet9_piece_9a & fillet9_piece_9b
    add(fillet9_piece_9, mode=Mode.SUBTRACT)
    with BuildSketch(Plane(origin=(-59.636523783, 13.062456472, 28.75), x_dir=(0, 1, 0), z_dir=(0, 0, 1))) as fillet9_piece_10a_section:
        with BuildLine():
            CenterArc((FILLET9_R, -FILLET9_R), FILLET9_R, 90, 90)
            Line((0, -FILLET9_R), (0, 0))
            Line((0, 0), (FILLET9_R, 0))
        make_face()
    fillet9_piece_10a = extrude(amount=105, mode=Mode.PRIVATE)
    fillet9_piece_10a = split(fillet9_piece_10a, bisect_by=Plane(origin=(-59.636523783, 13.062456472, 128.75), z_dir=(0, 0, 1)), keep=Keep.TOP, mode=Mode.PRIVATE)
    with BuildSketch(Plane(origin=(-59.636523783, 18.062456472, 128.75), x_dir=(0, 0, 1), z_dir=(0, -1, 0))) as fillet9_piece_10b_section:
        with BuildLine():
            CenterArc((FILLET9_R, -FILLET9_R), FILLET9_R, 90, 90)
            Line((0, -FILLET9_R), (0, 0))
            Line((0, 0), (FILLET9_R, 0))
        make_face()
    fillet9_piece_10b = extrude(amount=36.776495021, mode=Mode.PRIVATE)
    fillet9_piece_10b = split(fillet9_piece_10b, bisect_by=Plane(origin=(-59.636523783, 13.062456472, 128.75), z_dir=(0, 1, 0)), keep=Keep.TOP, mode=Mode.PRIVATE)
    fillet9_piece_10 = fillet9_piece_10a & fillet9_piece_10b
    add(fillet9_piece_10, mode=Mode.SUBTRACT)
    with BuildSketch(Plane(origin=(-40.761523783, -26.937543528, 157.5), x_dir=(0, 0, -1), z_dir=(0, 1, 0))) as fillet9_piece_11a_section:
        with BuildLine():
            CenterArc((FILLET9_R, FILLET9_R), FILLET9_R, 180, 90)
            Line((0, FILLET9_R), (0, 0))
            Line((0, 0), (FILLET9_R, 0))
        make_face()
    fillet9_piece_11a = extrude(amount=40, mode=Mode.PRIVATE)
    fillet9_piece_11a = split(fillet9_piece_11a, bisect_by=Plane(origin=(-40.761523783, -21.937543528, 157.5), z_dir=(0, -1, 0)), keep=Keep.TOP, mode=Mode.PRIVATE)
    with BuildSketch(Plane(origin=(24.238476217, -21.937543528, 157.5), x_dir=(0, 0, -1), z_dir=(-1, 0, 0))) as fillet9_piece_11b_section:
        with BuildLine():
            CenterArc((FILLET9_R, FILLET9_R), FILLET9_R, 180, 90)
            Line((0, FILLET9_R), (0, 0))
            Line((0, 0), (FILLET9_R, 0))
        make_face()
    fillet9_piece_11b = extrude(amount=70, mode=Mode.PRIVATE)
    fillet9_piece_11b = split(fillet9_piece_11b, bisect_by=Plane(origin=(-40.761523783, -21.937543528, 157.5), z_dir=(-1, 0, 0)), keep=Keep.TOP, mode=Mode.PRIVATE)
    fillet9_piece_11 = fillet9_piece_11a & fillet9_piece_11b
    add(fillet9_piece_11, mode=Mode.SUBTRACT)
    with BuildSketch(Plane(origin=(-40.761523783, -21.937543528, 157.5), x_dir=(0, 0, -1), z_dir=(0, 1, 0))) as fillet9_piece_12a_section:
        with BuildLine():
            CenterArc((FILLET9_R, FILLET9_R), FILLET9_R, 180, 90)
            Line((0, FILLET9_R), (0, 0))
            Line((0, 0), (FILLET9_R, 0))
        make_face()
    fillet9_piece_12a = extrude(amount=40, mode=Mode.PRIVATE)
    fillet9_piece_12a = split(fillet9_piece_12a, bisect_by=Plane(origin=(-40.761523783, 13.062456472, 157.5), z_dir=(0, 1, 0)), keep=Keep.TOP, mode=Mode.PRIVATE)
    with BuildSketch(Plane(origin=(-45.761523783, 13.062456472, 157.5), x_dir=(0, 1, 0), z_dir=(1, 0, 0))) as fillet9_piece_12b_section:
        with BuildLine():
            CenterArc((FILLET9_R, -FILLET9_R), FILLET9_R, 90, 90)
            Line((0, -FILLET9_R), (0, 0))
            Line((0, 0), (FILLET9_R, 0))
        make_face()
    fillet9_piece_12b = extrude(amount=70, mode=Mode.PRIVATE)
    fillet9_piece_12b = split(fillet9_piece_12b, bisect_by=Plane(origin=(-40.761523783, 13.062456472, 157.5), z_dir=(-1, 0, 0)), keep=Keep.TOP, mode=Mode.PRIVATE)
    fillet9_piece_12 = fillet9_piece_12a & fillet9_piece_12b
    add(fillet9_piece_12, mode=Mode.SUBTRACT)
    with BuildSketch(Plane(origin=(24.238476217, 13.062456472, 157.5), x_dir=(0, 0, -1), z_dir=(0, -1, 0))) as fillet9_piece_13a_section:
        with BuildLine():
            CenterArc((FILLET9_R, FILLET9_R), FILLET9_R, 180, 90)
            Line((0, FILLET9_R), (0, 0))
            Line((0, 0), (FILLET9_R, 0))
        make_face()
    fillet9_piece_13a = extrude(amount=40, mode=Mode.PRIVATE)
    fillet9_piece_13a = split(fillet9_piece_13a, bisect_by=Plane(origin=(24.238476217, -21.937543528, 157.5), z_dir=(0, -1, 0)), keep=Keep.TOP, mode=Mode.PRIVATE)
    with BuildSketch(Plane(origin=(29.238476217, -21.937543528, 157.5), x_dir=(0, 0, -1), z_dir=(-1, 0, 0))) as fillet9_piece_13b_section:
        with BuildLine():
            CenterArc((FILLET9_R, FILLET9_R), FILLET9_R, 180, 90)
            Line((0, FILLET9_R), (0, 0))
            Line((0, 0), (FILLET9_R, 0))
        make_face()
    fillet9_piece_13b = extrude(amount=70, mode=Mode.PRIVATE)
    fillet9_piece_13b = split(fillet9_piece_13b, bisect_by=Plane(origin=(24.238476217, -21.937543528, 157.5), z_dir=(1, 0, 0)), keep=Keep.TOP, mode=Mode.PRIVATE)
    fillet9_piece_13 = fillet9_piece_13a & fillet9_piece_13b
    add(fillet9_piece_13, mode=Mode.SUBTRACT)
    with BuildSketch(Plane(origin=(24.238476217, 18.062456472, 157.5), x_dir=(0, 0, -1), z_dir=(0, -1, 0))) as fillet9_piece_14a_section:
        with BuildLine():
            CenterArc((FILLET9_R, FILLET9_R), FILLET9_R, 180, 90)
            Line((0, FILLET9_R), (0, 0))
            Line((0, 0), (FILLET9_R, 0))
        make_face()
    fillet9_piece_14a = extrude(amount=40, mode=Mode.PRIVATE)
    fillet9_piece_14a = split(fillet9_piece_14a, bisect_by=Plane(origin=(24.238476217, 13.062456472, 157.5), z_dir=(0, 1, 0)), keep=Keep.TOP, mode=Mode.PRIVATE)
    with BuildSketch(Plane(origin=(-40.761523783, 13.062456472, 157.5), x_dir=(0, 1, 0), z_dir=(1, 0, 0))) as fillet9_piece_14b_section:
        with BuildLine():
            CenterArc((FILLET9_R, -FILLET9_R), FILLET9_R, 90, 90)
            Line((0, -FILLET9_R), (0, 0))
            Line((0, 0), (FILLET9_R, 0))
        make_face()
    fillet9_piece_14b = extrude(amount=70, mode=Mode.PRIVATE)
    fillet9_piece_14b = split(fillet9_piece_14b, bisect_by=Plane(origin=(24.238476217, 13.062456472, 157.5), z_dir=(1, 0, 0)), keep=Keep.TOP, mode=Mode.PRIVATE)
    fillet9_piece_14 = fillet9_piece_14a & fillet9_piece_14b
    add(fillet9_piece_14, mode=Mode.SUBTRACT)
    with BuildSketch(Plane(origin=(43.113476217, 13.062456472, 128.75), x_dir=(0, 1, 0), z_dir=(0, 0, -1))) as fillet9_piece_15a_section:
        with BuildLine():
            CenterArc((FILLET9_R, -FILLET9_R), FILLET9_R, 90, 90)
            Line((0, -FILLET9_R), (0, 0))
            Line((0, 0), (FILLET9_R, 0))
        make_face()
    fillet9_piece_15a = extrude(amount=105, mode=Mode.PRIVATE)
    fillet9_piece_15a = split(fillet9_piece_15a, bisect_by=Plane(origin=(43.113476217, 13.062456472, 28.75), z_dir=(0, 0, -1)), keep=Keep.TOP, mode=Mode.PRIVATE)
    with BuildSketch(Plane(origin=(43.113476217, 18.062456472, 28.75), x_dir=(0, 0, -1), z_dir=(0, -1, 0))) as fillet9_piece_15b_section:
        with BuildLine():
            CenterArc((FILLET9_R, -FILLET9_R), FILLET9_R, 90, 90)
            Line((0, -FILLET9_R), (0, 0))
            Line((0, 0), (FILLET9_R, 0))
        make_face()
    fillet9_piece_15b = extrude(amount=36.776495021, mode=Mode.PRIVATE)
    fillet9_piece_15b = split(fillet9_piece_15b, bisect_by=Plane(origin=(43.113476217, 13.062456472, 28.75), z_dir=(0, 1, 0)), keep=Keep.TOP, mode=Mode.PRIVATE)
    fillet9_piece_15 = fillet9_piece_15a & fillet9_piece_15b
    add(fillet9_piece_15, mode=Mode.SUBTRACT)
    with BuildSketch(Plane(origin=(43.113476217, -18.714038549, 23.75), x_dir=(0, -1, 0), z_dir=(0, 0, 1))) as fillet9_piece_16a_section:
        with BuildLine():
            CenterArc((FILLET9_R, -FILLET9_R), FILLET9_R, 90, 90)
            Line((0, -FILLET9_R), (0, 0))
            Line((0, 0), (FILLET9_R, 0))
        make_face()
    fillet9_piece_16a = extrude(amount=105, mode=Mode.PRIVATE)
    fillet9_piece_16a = split(fillet9_piece_16a, bisect_by=Plane(origin=(43.113476217, -18.714038549, 28.75), z_dir=(0, 0, -1)), keep=Keep.TOP, mode=Mode.PRIVATE)
    with BuildSketch(Plane(origin=(43.113476217, 13.062456472, 28.75), x_dir=(0, 0, -1), z_dir=(0, -1, 0))) as fillet9_piece_16b_section:
        with BuildLine():
            CenterArc((FILLET9_R, -FILLET9_R), FILLET9_R, 90, 90)
            Line((0, -FILLET9_R), (0, 0))
            Line((0, 0), (FILLET9_R, 0))
        make_face()
    fillet9_piece_16b = extrude(amount=36.776495021, mode=Mode.PRIVATE)
    fillet9_piece_16b = split(fillet9_piece_16b, bisect_by=Plane(origin=(43.113476217, -18.714038549, 28.75), z_dir=(0, -1, 0)), keep=Keep.TOP, mode=Mode.PRIVATE)
    fillet9_piece_16 = fillet9_piece_16a & fillet9_piece_16b
    add(fillet9_piece_16, mode=Mode.SUBTRACT)
    with BuildSketch(Plane(origin=(43.113476217, -18.714038549, 128.75), x_dir=(0, 0, 1), z_dir=(0, 1, 0))) as fillet9_piece_17a_section:
        with BuildLine():
            CenterArc((FILLET9_R, -FILLET9_R), FILLET9_R, 90, 90)
            Line((0, -FILLET9_R), (0, 0))
            Line((0, 0), (FILLET9_R, 0))
        make_face()
    fillet9_piece_17a = extrude(amount=36.776495021, mode=Mode.PRIVATE)
    fillet9_piece_17a = split(fillet9_piece_17a, bisect_by=Plane(origin=(43.113476217, 13.062456472, 128.75), z_dir=(0, 1, 0)), keep=Keep.TOP, mode=Mode.PRIVATE)
    with BuildSketch(Plane(origin=(43.113476217, 13.062456472, 133.75), x_dir=(0, 1, 0), z_dir=(0, 0, -1))) as fillet9_piece_17b_section:
        with BuildLine():
            CenterArc((FILLET9_R, -FILLET9_R), FILLET9_R, 90, 90)
            Line((0, -FILLET9_R), (0, 0))
            Line((0, 0), (FILLET9_R, 0))
        make_face()
    fillet9_piece_17b = extrude(amount=105, mode=Mode.PRIVATE)
    fillet9_piece_17b = split(fillet9_piece_17b, bisect_by=Plane(origin=(43.113476217, 13.062456472, 128.75), z_dir=(0, 0, 1)), keep=Keep.TOP, mode=Mode.PRIVATE)
    fillet9_piece_17 = fillet9_piece_17a & fillet9_piece_17b
    add(fillet9_piece_17, mode=Mode.SUBTRACT)
    with BuildSketch(Plane(origin=(43.113476217, -23.714038549, 128.75), x_dir=(0, 0, 1), z_dir=(0, 1, 0))) as fillet9_piece_18a_section:
        with BuildLine():
            CenterArc((FILLET9_R, -FILLET9_R), FILLET9_R, 90, 90)
            Line((0, -FILLET9_R), (0, 0))
            Line((0, 0), (FILLET9_R, 0))
        make_face()
    fillet9_piece_18a = extrude(amount=36.776495021, mode=Mode.PRIVATE)
    fillet9_piece_18a = split(fillet9_piece_18a, bisect_by=Plane(origin=(43.113476217, -18.714038549, 128.75), z_dir=(0, -1, 0)), keep=Keep.TOP, mode=Mode.PRIVATE)
    with BuildSketch(Plane(origin=(43.113476217, -18.714038549, 28.75), x_dir=(0, -1, 0), z_dir=(0, 0, 1))) as fillet9_piece_18b_section:
        with BuildLine():
            CenterArc((FILLET9_R, -FILLET9_R), FILLET9_R, 90, 90)
            Line((0, -FILLET9_R), (0, 0))
            Line((0, 0), (FILLET9_R, 0))
        make_face()
    fillet9_piece_18b = extrude(amount=105, mode=Mode.PRIVATE)
    fillet9_piece_18b = split(fillet9_piece_18b, bisect_by=Plane(origin=(43.113476217, -18.714038549, 128.75), z_dir=(0, 0, 1)), keep=Keep.TOP, mode=Mode.PRIVATE)
    fillet9_piece_18 = fillet9_piece_18a & fillet9_piece_18b
    add(fillet9_piece_18, mode=Mode.SUBTRACT)

    # Sketch13 → Cut-Extrude7 (cut)
    with BuildSketch(Plane(origin=(0, 16.812456472, 0), x_dir=(1, 0, 0), z_dir=(0, 1, 0))):
        with Locations((-8.265433855, -78.746089928)):
            Rectangle(SKETCH13_W, SKETCH13_H)
    extrude(amount=-CUT_EXTRUDE7_DEPTH, mode=Mode.SUBTRACT)


solid = part.part
